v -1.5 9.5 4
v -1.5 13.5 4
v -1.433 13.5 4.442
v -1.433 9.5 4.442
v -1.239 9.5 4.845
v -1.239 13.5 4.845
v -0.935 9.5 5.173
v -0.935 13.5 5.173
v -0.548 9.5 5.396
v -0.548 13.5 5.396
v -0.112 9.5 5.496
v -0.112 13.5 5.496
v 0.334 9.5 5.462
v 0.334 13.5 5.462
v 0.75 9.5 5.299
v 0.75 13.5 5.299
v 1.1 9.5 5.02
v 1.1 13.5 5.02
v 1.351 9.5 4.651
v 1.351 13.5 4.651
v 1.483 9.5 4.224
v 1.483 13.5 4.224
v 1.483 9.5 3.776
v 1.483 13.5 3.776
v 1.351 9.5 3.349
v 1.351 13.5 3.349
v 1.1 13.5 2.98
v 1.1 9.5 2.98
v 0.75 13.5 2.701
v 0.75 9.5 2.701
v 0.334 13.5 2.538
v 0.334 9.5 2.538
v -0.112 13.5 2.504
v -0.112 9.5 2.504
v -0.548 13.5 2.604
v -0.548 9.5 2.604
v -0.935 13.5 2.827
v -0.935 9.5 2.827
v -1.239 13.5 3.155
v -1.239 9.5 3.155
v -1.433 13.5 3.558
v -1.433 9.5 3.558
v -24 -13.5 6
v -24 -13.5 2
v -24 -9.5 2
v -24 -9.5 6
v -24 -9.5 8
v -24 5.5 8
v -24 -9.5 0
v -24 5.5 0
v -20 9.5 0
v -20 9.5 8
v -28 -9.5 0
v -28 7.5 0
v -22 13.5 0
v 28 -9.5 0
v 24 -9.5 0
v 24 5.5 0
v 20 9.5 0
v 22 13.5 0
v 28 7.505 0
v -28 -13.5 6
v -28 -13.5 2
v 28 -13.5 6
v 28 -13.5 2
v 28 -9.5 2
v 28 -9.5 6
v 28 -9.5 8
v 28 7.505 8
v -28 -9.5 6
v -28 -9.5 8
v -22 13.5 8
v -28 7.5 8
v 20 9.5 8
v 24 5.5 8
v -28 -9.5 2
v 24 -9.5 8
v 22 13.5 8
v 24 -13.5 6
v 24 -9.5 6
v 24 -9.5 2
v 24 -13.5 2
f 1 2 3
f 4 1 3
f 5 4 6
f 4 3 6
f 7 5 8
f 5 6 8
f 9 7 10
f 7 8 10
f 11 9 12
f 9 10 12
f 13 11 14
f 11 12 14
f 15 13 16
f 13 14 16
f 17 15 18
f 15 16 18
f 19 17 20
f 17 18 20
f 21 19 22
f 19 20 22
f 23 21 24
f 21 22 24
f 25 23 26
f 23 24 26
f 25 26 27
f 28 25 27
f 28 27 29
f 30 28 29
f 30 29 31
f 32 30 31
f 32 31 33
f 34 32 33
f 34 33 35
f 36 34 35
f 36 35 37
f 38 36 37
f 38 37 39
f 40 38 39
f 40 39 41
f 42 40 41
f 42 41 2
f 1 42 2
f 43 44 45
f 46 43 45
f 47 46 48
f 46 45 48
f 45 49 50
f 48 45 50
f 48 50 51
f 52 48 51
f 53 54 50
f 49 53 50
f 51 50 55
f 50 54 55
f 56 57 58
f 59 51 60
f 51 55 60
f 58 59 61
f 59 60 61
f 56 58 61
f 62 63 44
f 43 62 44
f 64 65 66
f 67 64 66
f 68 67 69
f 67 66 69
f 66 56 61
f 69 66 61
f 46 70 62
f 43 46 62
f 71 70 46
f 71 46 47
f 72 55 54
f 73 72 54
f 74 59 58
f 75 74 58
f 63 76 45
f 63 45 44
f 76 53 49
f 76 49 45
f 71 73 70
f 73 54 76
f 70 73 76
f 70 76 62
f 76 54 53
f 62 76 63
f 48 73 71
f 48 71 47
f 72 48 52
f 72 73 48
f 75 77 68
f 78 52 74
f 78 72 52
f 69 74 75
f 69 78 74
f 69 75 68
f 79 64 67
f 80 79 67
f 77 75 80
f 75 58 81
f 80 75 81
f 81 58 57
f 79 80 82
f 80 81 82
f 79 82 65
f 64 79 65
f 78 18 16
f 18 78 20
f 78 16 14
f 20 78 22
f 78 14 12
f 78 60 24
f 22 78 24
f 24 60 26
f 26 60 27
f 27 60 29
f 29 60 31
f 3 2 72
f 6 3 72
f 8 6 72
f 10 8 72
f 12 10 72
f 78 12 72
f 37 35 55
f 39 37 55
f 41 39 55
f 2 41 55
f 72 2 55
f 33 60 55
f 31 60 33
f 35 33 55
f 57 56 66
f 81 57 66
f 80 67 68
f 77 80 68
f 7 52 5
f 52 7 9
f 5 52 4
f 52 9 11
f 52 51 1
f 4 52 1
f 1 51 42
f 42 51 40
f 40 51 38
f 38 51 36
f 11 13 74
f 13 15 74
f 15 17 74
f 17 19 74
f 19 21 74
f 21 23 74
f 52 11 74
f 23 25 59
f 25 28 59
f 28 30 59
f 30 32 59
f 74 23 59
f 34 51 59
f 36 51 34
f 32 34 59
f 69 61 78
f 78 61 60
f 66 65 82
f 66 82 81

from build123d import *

# Parameters (mm, degrees)
F1_DEPTH = 8
F2_W     = 4
F2_H     = 2
F3_DEPTH = 4.2
F4_W     = 4
F4_H     = 2
F5_DEPTH = 4.1
F6_R     = 1.5
F7_DEPTH = 5


with BuildPart() as f1:
    # F0 (on Top) → F1 (new body)
    with BuildSketch(Plane.XY):
        Polygon((-28, 7.5), (-28, -13.5), (-24, -13.5), (-24, 5.5), (-20, 9.5), (20, 9.5), (24, 5.5), (24, -13.5), (28, -13.5), (28, 7.50455), (22, 13.5), (-22, 13.5), align=None)
    extrude(amount=F1_DEPTH)

    # F2 (on face) → F3 (cut)
    with BuildSketch(Plane.YZ.offset(28)):
        with Locations((-11.5, 7)):
            Rectangle(F2_W, F2_H)
        with Locations((-11.5, 1)):
            Rectangle(F2_W, F2_H)
    extrude(amount=-F3_DEPTH, mode=Mode.SUBTRACT)

    # F4 (on face) → F5 (cut)
    with BuildSketch(Plane(origin=(-28, 0, 0), x_dir=(0, -1, 0), z_dir=(-1, 0, 0))):
        with Locations((11.5, 1)):
            Rectangle(F4_W, F4_H)
        with Locations((11.5, 7)):
            Rectangle(F4_W, F4_H)
    extrude(amount=-F5_DEPTH, mode=Mode.SUBTRACT)

    # F6 (on face) → F7 (cut)
    with BuildSketch(Plane(origin=(0, 13.5, 0), x_dir=(-1, 0, 0), z_dir=(0, 1, 0))):
        with Locations((0, 4)):
            Circle(F6_R)
    extrude(amount=-F7_DEPTH, mode=Mode.SUBTRACT)


solid = f1.part
